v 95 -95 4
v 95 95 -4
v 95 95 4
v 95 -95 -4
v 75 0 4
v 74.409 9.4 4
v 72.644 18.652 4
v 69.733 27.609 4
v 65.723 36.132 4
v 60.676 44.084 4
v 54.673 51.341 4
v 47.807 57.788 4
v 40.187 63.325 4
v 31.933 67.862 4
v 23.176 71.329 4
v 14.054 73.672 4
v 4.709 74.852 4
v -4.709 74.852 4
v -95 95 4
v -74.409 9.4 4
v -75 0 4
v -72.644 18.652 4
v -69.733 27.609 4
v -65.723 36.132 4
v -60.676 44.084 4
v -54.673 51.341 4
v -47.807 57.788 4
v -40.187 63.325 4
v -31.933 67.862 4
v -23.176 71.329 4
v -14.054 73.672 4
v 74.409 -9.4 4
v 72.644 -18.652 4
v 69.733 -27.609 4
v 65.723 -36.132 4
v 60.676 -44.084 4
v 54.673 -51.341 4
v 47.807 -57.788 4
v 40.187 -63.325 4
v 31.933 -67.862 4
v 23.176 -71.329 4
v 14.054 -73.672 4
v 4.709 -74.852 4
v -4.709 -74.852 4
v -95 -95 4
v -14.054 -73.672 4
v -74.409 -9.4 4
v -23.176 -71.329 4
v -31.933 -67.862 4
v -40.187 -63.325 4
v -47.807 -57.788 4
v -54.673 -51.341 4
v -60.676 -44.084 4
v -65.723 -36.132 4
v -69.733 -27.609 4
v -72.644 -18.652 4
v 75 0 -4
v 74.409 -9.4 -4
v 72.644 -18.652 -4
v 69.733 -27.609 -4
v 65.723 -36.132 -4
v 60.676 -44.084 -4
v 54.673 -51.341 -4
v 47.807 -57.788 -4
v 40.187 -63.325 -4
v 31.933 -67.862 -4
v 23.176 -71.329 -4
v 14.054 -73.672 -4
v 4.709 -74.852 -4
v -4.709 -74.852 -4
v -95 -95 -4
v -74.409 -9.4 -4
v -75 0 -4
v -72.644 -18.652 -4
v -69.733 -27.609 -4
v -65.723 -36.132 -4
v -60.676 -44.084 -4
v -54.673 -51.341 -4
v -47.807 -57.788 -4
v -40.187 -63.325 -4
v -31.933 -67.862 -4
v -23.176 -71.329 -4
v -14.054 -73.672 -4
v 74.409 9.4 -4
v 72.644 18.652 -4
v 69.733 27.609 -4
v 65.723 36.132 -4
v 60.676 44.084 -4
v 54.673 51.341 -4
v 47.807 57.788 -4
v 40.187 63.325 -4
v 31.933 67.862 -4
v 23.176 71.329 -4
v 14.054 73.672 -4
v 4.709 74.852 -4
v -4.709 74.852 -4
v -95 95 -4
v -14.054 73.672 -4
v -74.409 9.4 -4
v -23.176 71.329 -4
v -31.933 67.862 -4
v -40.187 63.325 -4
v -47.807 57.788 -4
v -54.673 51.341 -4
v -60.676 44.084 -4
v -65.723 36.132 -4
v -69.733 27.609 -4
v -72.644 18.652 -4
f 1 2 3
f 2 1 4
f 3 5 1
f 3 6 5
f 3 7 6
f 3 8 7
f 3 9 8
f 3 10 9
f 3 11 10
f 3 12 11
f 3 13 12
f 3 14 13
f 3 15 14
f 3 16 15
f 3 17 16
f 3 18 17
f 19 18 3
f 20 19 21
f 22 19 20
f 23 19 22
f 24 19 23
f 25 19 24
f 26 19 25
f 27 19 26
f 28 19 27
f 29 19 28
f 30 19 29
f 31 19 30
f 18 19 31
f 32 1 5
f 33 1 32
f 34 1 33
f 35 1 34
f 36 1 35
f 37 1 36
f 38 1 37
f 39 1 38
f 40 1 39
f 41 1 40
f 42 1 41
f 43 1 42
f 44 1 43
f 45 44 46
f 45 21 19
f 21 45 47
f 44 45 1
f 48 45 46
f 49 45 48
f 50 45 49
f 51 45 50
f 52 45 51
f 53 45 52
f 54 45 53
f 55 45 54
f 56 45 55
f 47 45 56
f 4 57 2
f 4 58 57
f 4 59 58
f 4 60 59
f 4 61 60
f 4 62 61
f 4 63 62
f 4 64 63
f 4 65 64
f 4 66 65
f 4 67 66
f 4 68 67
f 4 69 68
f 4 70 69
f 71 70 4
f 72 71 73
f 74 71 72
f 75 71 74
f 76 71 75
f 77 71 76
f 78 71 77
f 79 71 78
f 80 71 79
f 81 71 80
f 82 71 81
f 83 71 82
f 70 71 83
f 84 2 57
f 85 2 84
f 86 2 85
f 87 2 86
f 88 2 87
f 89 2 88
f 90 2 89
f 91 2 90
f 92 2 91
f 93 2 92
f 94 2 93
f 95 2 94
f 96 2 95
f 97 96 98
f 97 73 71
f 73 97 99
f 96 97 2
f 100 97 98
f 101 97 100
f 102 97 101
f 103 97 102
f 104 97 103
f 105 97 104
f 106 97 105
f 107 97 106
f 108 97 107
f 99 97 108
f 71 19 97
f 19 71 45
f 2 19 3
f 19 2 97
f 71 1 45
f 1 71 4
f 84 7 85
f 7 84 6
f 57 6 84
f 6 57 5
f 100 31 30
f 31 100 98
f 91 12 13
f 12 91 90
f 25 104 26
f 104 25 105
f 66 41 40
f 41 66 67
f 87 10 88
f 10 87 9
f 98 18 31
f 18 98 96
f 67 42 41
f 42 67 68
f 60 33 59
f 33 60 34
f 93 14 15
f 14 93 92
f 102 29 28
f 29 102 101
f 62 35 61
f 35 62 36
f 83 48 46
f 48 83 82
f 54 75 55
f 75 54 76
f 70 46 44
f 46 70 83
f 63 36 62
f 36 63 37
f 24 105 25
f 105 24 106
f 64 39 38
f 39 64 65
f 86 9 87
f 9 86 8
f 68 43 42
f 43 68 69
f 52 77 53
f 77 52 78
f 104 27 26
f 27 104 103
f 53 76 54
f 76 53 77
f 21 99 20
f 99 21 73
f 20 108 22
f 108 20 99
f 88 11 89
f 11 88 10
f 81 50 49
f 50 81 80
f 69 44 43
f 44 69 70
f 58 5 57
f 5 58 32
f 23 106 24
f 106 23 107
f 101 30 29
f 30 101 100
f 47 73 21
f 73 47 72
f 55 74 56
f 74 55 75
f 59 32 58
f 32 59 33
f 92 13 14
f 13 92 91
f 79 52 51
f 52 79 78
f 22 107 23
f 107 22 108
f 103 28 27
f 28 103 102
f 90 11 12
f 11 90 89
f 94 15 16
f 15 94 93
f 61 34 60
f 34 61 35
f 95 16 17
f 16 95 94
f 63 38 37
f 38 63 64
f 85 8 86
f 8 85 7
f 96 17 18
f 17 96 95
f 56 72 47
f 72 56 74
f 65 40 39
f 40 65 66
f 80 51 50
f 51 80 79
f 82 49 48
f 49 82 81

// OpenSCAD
thickness = 8;
inner_diameter = 150;
frame_width = 190;

$fn = 50;

module index()
{
	difference()
	{
		cube([ frame_width, frame_width, thickness ], center = true);
		cylinder(d = inner_diameter, h = thickness, center = true);
	}
}

index();
